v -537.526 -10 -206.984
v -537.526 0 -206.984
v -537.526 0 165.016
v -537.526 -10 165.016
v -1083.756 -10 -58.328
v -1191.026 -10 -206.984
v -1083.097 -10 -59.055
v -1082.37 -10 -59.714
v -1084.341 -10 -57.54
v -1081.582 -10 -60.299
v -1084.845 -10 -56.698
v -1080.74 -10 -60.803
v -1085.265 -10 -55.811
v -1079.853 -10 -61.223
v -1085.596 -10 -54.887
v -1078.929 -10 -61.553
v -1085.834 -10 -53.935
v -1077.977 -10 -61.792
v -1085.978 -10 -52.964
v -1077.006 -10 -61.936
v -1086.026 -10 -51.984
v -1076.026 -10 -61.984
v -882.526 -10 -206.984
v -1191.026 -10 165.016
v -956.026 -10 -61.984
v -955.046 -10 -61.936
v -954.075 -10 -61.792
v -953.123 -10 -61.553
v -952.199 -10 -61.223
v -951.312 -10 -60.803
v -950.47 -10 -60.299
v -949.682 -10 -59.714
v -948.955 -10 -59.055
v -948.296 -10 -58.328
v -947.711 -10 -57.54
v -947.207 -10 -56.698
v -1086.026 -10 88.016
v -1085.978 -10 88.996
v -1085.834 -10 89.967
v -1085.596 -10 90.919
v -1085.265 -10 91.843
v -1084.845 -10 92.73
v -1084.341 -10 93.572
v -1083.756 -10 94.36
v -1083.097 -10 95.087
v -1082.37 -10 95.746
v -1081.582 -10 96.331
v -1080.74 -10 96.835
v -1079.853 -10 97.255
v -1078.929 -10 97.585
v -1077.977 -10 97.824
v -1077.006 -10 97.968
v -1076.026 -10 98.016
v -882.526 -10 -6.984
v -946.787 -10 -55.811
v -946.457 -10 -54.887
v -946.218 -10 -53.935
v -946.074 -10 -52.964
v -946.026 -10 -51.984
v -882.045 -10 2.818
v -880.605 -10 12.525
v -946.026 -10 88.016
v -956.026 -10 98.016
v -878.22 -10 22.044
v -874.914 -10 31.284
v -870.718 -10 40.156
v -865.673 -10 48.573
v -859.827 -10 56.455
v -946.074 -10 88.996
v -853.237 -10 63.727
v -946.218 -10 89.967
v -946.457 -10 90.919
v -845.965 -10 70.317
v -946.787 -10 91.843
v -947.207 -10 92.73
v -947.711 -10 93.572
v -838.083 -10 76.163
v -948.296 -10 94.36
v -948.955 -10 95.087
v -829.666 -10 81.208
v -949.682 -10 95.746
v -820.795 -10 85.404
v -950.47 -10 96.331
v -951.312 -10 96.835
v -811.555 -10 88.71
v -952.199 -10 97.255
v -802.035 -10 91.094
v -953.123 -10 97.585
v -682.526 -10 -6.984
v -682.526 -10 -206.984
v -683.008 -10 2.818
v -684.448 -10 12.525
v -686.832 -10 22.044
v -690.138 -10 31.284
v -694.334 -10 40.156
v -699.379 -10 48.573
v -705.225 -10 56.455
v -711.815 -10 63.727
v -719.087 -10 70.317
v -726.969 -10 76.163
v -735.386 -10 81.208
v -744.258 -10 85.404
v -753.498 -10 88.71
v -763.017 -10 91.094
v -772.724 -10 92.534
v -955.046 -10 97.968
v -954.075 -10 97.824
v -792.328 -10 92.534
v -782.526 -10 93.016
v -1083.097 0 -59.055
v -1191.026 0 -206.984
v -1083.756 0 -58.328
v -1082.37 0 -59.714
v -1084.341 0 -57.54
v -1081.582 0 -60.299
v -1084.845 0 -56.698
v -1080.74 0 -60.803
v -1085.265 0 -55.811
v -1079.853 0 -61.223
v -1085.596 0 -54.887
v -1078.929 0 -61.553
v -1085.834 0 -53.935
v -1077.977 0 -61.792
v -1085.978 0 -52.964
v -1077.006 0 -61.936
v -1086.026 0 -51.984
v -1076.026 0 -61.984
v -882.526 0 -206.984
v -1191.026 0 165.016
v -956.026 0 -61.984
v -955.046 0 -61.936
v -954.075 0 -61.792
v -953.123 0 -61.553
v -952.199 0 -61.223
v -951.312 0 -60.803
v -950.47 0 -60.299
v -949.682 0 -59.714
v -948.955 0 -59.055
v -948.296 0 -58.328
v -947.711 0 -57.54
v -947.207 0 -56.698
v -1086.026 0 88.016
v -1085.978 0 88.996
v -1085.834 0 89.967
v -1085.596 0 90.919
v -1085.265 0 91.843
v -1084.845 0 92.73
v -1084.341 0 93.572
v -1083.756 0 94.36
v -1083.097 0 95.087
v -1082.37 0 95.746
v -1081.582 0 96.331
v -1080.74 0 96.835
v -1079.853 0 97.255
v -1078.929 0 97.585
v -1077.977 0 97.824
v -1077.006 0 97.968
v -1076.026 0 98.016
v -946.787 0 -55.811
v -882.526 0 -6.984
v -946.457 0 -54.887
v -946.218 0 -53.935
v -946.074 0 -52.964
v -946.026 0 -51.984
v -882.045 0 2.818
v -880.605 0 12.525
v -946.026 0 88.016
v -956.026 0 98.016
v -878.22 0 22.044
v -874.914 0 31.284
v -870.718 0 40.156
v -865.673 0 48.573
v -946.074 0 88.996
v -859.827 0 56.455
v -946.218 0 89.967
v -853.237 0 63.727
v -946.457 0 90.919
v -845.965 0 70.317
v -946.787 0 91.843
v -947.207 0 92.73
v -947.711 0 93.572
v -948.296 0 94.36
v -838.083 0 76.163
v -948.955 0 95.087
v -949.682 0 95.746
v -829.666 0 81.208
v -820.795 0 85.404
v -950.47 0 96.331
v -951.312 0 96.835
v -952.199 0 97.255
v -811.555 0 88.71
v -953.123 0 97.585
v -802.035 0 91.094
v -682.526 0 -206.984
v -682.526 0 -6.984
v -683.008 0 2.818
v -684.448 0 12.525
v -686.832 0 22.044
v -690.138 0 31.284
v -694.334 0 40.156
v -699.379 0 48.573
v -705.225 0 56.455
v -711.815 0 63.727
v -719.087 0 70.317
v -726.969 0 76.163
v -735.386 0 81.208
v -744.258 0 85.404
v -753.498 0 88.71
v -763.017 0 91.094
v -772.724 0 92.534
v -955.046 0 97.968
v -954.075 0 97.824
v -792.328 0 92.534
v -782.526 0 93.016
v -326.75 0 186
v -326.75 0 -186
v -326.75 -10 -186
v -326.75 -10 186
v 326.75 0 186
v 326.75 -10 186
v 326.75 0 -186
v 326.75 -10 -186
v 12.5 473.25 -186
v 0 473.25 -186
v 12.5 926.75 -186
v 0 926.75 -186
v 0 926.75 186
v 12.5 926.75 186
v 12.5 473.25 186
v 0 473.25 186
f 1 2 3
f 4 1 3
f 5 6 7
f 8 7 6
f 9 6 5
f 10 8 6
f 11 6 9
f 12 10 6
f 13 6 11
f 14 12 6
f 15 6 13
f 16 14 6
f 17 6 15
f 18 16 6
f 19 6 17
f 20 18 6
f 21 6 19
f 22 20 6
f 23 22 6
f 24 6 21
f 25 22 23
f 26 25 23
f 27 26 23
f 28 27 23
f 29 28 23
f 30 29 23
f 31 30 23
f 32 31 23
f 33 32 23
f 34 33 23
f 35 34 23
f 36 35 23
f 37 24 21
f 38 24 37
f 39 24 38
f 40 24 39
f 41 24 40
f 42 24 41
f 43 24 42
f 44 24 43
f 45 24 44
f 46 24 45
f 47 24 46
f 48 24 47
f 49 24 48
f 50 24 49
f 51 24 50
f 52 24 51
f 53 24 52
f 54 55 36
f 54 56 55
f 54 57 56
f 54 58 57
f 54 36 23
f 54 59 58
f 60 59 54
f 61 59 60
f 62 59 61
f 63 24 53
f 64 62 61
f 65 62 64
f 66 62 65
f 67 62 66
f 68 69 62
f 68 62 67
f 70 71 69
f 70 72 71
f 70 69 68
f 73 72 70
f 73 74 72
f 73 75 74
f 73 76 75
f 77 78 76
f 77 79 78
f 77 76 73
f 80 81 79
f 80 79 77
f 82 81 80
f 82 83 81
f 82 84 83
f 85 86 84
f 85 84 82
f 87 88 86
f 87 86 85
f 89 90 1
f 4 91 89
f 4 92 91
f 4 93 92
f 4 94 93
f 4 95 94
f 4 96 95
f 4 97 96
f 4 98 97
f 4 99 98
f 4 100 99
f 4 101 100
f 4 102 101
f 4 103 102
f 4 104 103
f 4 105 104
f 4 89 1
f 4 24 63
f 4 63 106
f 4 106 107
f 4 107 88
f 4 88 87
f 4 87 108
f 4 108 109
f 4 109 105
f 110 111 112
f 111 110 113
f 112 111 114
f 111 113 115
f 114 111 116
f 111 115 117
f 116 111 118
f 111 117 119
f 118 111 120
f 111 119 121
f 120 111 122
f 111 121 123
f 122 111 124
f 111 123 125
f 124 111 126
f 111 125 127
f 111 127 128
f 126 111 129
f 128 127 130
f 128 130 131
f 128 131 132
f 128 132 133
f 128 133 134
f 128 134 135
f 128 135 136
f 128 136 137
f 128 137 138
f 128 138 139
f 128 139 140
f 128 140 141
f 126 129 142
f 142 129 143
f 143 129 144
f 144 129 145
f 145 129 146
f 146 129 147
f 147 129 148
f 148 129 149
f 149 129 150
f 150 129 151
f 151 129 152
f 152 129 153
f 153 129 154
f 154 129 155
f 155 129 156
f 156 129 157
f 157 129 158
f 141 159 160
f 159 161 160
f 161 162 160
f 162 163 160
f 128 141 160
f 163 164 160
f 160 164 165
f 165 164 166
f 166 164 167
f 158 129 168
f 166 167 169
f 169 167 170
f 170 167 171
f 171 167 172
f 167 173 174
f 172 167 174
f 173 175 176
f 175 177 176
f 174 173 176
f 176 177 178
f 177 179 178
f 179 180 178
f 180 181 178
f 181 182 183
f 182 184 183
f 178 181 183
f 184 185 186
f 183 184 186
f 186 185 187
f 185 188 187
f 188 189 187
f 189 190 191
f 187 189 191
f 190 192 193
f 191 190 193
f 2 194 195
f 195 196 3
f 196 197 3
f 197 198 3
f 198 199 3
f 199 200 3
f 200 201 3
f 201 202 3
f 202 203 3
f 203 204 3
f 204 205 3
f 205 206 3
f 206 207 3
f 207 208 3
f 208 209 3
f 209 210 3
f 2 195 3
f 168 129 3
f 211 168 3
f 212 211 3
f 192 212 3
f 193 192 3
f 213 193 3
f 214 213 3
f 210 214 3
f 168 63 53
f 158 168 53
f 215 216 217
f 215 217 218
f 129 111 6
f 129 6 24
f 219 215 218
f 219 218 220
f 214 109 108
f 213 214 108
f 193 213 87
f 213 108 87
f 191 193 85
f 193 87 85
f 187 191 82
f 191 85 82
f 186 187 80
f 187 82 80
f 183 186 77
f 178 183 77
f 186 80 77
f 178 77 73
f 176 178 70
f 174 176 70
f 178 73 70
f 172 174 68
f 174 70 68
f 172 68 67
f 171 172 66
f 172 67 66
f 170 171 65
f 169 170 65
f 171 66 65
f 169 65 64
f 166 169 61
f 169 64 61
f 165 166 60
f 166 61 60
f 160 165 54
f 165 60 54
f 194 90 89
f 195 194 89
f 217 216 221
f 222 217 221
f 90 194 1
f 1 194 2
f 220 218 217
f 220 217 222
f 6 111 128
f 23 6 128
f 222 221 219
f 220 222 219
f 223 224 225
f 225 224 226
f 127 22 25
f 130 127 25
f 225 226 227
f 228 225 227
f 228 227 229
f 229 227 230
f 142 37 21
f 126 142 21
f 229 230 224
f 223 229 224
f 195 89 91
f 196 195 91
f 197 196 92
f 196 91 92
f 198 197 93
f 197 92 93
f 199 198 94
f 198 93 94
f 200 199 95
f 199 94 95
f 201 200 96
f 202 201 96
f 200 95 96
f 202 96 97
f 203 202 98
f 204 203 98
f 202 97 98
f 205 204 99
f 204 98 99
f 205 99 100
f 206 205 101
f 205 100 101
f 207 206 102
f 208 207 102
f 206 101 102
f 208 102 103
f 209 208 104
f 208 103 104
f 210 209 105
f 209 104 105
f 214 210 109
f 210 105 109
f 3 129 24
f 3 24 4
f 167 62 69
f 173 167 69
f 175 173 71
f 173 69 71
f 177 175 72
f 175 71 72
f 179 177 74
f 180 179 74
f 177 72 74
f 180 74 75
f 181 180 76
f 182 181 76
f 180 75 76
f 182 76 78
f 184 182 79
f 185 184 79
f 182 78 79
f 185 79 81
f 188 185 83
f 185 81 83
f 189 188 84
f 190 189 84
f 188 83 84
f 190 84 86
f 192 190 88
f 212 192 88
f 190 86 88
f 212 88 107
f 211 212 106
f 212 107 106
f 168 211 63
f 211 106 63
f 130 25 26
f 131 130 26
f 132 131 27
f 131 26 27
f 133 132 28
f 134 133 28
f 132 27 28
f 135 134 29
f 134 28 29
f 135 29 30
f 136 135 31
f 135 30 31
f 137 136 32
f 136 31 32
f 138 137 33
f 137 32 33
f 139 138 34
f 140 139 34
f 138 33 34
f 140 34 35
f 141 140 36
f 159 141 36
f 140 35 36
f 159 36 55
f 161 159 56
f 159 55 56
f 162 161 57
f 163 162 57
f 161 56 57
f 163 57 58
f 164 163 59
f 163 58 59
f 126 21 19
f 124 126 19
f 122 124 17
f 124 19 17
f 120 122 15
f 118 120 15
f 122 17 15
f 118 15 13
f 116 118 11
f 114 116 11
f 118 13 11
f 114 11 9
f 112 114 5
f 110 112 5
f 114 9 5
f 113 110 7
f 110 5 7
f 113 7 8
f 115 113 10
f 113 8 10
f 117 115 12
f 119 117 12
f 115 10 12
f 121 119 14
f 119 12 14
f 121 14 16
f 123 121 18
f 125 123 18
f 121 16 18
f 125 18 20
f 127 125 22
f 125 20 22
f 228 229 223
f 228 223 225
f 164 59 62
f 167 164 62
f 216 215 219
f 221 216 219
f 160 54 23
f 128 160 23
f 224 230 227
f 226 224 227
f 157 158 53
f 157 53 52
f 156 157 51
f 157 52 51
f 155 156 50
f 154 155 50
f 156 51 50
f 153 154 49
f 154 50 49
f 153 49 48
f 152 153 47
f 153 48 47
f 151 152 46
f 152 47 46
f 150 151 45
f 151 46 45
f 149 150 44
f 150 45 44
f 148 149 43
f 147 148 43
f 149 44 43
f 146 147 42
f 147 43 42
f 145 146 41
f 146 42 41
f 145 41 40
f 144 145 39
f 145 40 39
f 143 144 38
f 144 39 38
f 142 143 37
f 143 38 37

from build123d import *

# Parameters (mm, degrees)
F0_W     = 653.5
F0_H     = 372
F1_DEPTH = 10
F3_DEPTH = 12.5
F5_DEPTH = 10


with BuildPart() as f1:
    # F0 (on Front) → F1 (new body)
    with BuildSketch(Plane.XZ):
        Rectangle(F0_W, F0_H)
        with Locations((-864.276171, -20.984091)):
            Rectangle(F0_W, F0_H)
    extrude(amount=F1_DEPTH)

    # F4 (on face) → F5 (cut)
    with BuildSketch(Plane.XZ.offset(10)):
        with BuildLine():
            ThreePointArc((-946.026171, 88.015909), (-948.955103, 95.086977), (-956.026171, 98.015909))
            Line((-956.026171, 98.015909), (-1076.026171, 98.015909))
            ThreePointArc((-1076.026171, 98.015909), (-1083.097239, 95.086977), (-1086.026171, 88.015909))
            Line((-1086.026171, 88.015909), (-1086.026171, -51.984091))
            ThreePointArc((-1086.026171, -51.984091), (-1083.097239, -59.055159), (-1076.026171, -61.984091))
            Line((-1076.026171, -61.984091), (-956.026171, -61.984091))
            ThreePointArc((-956.026171, -61.984091), (-948.955103, -59.055159), (-946.026171, -51.984091))
            Line((-946.026171, -51.984091), (-946.026171, 88.015909))
        make_face()
        with BuildLine():
            Line((-882.526171, -6.984091), (-882.526171, -206.984091))
            Line((-882.526171, -206.984091), (-682.526171, -206.984091))
            Line((-682.526171, -206.984091), (-682.526171, -6.984091))
            ThreePointArc((-682.526171, -6.984091), (-711.815493, 63.726587), (-782.526171, 93.015909))
            ThreePointArc((-782.526171, 93.015909), (-853.236849, 63.726587), (-882.526171, -6.984091))
        make_face()
    extrude(amount=-F5_DEPTH, mode=Mode.SUBTRACT)


with BuildPart() as f3:
    # F2 (on Right) → F3 (new body)
    with BuildSketch(Plane.YZ):
        Polygon((926.75, 186), (473.25, 186), (473.25, 0), (473.25, -186), (926.75, -186), align=None)
    extrude(amount=F3_DEPTH)


solid = Compound([f1.part, f3.part])
